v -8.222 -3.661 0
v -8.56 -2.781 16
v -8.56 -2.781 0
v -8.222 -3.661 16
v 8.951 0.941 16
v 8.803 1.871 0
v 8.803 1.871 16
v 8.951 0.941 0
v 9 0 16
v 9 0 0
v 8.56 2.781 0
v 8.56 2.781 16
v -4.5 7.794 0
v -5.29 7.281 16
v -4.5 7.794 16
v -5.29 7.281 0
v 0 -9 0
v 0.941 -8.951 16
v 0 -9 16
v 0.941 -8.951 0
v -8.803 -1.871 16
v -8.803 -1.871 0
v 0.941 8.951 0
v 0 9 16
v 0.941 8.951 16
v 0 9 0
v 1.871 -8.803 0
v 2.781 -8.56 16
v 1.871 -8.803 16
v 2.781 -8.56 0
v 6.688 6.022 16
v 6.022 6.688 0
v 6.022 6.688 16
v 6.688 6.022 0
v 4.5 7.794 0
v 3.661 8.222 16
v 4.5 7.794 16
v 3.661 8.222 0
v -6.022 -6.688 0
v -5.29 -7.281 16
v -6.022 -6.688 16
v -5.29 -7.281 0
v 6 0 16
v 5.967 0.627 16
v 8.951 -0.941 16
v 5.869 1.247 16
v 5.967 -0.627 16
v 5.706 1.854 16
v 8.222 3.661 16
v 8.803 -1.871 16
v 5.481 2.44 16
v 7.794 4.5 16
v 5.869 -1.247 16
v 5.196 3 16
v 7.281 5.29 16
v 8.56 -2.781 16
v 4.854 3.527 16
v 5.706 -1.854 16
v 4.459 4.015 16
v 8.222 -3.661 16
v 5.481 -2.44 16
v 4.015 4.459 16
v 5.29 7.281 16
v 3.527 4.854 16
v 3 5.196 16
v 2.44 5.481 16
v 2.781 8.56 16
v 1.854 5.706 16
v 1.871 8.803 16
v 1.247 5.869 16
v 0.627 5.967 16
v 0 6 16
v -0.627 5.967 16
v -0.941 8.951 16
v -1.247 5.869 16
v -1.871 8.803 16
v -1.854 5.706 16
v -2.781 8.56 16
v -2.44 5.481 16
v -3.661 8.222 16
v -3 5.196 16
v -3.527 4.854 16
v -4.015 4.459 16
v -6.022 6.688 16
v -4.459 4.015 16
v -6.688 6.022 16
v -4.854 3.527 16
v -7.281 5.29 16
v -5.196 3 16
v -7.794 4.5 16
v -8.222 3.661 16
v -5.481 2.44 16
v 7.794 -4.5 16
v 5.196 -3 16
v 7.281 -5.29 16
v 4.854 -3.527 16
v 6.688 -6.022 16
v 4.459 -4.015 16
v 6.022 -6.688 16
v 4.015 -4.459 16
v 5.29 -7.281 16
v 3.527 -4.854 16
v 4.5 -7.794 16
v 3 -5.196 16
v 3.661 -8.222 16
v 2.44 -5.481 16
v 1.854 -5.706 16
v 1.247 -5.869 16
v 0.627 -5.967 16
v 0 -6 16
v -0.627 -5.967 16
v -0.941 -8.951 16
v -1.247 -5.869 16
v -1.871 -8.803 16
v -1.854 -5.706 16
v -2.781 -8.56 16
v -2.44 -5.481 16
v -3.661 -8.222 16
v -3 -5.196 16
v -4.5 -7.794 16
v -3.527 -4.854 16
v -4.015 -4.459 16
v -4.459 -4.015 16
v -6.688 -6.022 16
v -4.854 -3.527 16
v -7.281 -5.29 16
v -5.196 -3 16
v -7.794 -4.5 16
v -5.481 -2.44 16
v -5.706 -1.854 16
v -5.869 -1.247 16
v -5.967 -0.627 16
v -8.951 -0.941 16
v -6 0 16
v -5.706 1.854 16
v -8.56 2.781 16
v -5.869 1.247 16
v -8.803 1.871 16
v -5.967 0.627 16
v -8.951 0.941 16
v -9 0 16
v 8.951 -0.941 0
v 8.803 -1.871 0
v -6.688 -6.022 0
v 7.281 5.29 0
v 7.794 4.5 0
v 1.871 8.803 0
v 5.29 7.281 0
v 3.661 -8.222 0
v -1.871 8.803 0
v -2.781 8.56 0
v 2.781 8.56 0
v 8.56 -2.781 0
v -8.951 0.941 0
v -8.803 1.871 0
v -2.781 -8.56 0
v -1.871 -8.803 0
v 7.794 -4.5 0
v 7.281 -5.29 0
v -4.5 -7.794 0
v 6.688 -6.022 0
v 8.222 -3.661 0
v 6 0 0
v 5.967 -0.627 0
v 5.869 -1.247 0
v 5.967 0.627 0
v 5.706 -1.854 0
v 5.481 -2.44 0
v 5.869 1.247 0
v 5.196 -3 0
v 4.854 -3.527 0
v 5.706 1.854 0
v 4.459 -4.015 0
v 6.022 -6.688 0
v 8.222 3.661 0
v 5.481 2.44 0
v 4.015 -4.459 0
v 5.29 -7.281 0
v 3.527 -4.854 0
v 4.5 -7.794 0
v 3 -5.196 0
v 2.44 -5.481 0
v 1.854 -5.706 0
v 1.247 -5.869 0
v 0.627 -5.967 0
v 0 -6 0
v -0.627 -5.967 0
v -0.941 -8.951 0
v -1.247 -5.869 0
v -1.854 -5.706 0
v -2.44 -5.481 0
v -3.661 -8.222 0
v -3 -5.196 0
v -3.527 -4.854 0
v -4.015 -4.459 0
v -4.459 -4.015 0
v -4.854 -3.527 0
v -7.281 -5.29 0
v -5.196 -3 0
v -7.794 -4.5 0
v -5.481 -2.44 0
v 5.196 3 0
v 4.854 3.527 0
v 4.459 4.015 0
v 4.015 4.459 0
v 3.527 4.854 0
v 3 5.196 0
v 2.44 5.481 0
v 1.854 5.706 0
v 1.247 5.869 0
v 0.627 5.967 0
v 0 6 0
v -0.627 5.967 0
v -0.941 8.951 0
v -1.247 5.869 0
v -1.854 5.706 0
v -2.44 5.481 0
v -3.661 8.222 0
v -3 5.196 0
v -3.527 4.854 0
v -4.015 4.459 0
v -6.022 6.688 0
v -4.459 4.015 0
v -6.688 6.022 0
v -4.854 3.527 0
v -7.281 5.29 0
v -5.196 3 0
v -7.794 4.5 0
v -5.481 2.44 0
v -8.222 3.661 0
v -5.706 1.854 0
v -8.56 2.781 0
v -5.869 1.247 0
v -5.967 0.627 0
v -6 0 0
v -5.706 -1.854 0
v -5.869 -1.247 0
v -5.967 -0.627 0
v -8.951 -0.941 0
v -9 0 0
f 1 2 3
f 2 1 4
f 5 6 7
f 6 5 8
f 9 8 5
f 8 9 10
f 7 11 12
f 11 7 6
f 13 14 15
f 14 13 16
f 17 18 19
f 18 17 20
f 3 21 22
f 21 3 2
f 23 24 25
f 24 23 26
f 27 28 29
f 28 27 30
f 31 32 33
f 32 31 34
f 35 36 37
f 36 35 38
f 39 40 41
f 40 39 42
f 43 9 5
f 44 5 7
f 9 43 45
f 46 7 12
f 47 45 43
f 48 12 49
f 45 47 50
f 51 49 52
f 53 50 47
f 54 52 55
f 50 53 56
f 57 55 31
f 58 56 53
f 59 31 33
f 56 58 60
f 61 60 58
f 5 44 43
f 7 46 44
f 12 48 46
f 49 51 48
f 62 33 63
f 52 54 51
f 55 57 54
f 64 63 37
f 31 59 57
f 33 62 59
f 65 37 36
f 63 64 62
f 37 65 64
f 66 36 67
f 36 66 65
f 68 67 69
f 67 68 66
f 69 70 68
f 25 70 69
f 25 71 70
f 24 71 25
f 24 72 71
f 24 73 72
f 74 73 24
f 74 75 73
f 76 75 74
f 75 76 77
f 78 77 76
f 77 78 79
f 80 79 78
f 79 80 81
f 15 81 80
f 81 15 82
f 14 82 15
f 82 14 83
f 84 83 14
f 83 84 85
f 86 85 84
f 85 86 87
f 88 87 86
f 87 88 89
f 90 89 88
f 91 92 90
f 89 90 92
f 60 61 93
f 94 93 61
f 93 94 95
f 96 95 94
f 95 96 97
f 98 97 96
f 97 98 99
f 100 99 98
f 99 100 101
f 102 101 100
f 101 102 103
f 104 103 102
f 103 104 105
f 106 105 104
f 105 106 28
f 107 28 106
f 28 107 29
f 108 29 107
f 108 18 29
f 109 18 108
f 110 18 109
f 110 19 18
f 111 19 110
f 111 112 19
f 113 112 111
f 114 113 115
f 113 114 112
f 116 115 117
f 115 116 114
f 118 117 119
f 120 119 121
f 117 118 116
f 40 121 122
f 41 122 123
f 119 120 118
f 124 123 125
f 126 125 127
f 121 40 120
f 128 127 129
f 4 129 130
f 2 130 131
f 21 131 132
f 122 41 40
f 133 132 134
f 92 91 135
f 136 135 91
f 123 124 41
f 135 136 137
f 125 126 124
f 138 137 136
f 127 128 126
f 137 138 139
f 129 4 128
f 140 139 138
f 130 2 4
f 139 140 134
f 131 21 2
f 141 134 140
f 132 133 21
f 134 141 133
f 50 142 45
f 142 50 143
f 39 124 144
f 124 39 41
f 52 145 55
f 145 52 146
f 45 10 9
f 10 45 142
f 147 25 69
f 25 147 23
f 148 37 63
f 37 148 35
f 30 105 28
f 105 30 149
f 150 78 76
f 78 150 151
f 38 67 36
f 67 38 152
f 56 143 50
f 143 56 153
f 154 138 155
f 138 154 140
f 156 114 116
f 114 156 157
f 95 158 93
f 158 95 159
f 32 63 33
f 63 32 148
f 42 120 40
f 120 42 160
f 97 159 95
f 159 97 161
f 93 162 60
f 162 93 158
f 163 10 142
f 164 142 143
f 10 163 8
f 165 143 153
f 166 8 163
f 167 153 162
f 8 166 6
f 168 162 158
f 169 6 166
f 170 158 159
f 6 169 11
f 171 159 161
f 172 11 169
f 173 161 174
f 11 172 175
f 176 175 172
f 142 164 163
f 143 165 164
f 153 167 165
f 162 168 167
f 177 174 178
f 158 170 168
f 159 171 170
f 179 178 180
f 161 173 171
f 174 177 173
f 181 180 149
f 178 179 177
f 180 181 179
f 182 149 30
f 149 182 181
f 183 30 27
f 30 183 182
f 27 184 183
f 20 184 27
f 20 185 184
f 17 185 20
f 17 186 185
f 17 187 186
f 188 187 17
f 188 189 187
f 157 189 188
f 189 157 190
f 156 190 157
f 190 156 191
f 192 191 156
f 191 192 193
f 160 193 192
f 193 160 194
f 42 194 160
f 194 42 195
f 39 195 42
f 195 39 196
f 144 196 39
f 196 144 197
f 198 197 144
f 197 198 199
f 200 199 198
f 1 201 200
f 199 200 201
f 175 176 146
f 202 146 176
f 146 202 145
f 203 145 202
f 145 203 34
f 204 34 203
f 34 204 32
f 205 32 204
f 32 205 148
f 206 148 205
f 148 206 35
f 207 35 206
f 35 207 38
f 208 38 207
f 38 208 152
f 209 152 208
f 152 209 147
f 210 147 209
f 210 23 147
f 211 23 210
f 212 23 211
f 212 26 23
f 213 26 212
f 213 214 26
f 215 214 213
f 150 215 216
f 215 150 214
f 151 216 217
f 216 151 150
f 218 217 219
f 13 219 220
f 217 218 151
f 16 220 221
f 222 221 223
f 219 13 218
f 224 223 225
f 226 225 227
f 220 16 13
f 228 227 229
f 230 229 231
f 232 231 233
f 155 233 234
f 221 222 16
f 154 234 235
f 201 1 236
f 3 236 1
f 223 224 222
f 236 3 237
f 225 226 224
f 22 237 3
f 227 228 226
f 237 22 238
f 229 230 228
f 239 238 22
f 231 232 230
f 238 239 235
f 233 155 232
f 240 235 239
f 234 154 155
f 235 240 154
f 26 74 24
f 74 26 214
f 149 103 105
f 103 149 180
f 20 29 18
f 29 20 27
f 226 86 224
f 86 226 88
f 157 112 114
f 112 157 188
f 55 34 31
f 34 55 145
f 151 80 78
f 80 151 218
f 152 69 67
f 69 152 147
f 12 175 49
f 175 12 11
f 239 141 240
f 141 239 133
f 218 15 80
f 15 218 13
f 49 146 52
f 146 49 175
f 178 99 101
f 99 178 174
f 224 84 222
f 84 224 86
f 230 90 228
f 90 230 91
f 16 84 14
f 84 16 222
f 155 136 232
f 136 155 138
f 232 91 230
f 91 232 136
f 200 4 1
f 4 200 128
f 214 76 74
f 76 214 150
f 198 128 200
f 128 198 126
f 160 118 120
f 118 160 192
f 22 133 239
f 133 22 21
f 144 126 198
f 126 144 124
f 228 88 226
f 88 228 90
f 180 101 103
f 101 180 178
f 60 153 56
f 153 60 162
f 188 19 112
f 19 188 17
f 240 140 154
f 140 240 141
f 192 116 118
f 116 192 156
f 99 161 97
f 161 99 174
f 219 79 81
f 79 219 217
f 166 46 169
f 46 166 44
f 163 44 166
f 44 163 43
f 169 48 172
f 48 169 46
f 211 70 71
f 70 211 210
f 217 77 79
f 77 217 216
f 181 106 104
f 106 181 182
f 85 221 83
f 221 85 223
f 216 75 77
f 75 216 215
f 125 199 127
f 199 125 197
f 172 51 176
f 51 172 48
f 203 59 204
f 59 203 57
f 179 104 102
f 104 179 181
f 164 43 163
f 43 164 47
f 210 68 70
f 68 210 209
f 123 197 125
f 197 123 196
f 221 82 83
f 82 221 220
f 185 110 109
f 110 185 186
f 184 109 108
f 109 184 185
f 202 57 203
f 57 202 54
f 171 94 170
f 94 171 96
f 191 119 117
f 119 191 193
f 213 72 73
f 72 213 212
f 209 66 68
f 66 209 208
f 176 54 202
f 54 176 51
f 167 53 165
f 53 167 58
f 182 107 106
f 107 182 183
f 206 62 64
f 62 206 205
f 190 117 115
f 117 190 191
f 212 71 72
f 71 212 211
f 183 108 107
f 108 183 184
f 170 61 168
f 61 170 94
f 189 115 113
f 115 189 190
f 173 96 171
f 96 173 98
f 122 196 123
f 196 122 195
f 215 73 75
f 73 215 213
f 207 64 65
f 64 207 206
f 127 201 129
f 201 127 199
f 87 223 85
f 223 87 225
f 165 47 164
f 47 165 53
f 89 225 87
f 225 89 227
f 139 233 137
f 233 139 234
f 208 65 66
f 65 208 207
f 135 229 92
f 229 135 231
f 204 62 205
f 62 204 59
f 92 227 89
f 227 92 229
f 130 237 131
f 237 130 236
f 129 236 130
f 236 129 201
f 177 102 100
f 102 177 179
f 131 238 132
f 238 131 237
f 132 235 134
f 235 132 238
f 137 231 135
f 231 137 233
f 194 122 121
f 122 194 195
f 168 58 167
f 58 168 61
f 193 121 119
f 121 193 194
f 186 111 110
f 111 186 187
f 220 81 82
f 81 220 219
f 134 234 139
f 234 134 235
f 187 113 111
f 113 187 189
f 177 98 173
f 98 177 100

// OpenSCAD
// Axle spacer tube.
$fn = 60;
eps = 0.02;
inner_d = 12;
outer_d = 18;
length = 16;
difference() { cylinder(d = outer_d, h = length); translate([0,0,-eps]) cylinder(d = inner_d, h = length + 2 * eps); }
